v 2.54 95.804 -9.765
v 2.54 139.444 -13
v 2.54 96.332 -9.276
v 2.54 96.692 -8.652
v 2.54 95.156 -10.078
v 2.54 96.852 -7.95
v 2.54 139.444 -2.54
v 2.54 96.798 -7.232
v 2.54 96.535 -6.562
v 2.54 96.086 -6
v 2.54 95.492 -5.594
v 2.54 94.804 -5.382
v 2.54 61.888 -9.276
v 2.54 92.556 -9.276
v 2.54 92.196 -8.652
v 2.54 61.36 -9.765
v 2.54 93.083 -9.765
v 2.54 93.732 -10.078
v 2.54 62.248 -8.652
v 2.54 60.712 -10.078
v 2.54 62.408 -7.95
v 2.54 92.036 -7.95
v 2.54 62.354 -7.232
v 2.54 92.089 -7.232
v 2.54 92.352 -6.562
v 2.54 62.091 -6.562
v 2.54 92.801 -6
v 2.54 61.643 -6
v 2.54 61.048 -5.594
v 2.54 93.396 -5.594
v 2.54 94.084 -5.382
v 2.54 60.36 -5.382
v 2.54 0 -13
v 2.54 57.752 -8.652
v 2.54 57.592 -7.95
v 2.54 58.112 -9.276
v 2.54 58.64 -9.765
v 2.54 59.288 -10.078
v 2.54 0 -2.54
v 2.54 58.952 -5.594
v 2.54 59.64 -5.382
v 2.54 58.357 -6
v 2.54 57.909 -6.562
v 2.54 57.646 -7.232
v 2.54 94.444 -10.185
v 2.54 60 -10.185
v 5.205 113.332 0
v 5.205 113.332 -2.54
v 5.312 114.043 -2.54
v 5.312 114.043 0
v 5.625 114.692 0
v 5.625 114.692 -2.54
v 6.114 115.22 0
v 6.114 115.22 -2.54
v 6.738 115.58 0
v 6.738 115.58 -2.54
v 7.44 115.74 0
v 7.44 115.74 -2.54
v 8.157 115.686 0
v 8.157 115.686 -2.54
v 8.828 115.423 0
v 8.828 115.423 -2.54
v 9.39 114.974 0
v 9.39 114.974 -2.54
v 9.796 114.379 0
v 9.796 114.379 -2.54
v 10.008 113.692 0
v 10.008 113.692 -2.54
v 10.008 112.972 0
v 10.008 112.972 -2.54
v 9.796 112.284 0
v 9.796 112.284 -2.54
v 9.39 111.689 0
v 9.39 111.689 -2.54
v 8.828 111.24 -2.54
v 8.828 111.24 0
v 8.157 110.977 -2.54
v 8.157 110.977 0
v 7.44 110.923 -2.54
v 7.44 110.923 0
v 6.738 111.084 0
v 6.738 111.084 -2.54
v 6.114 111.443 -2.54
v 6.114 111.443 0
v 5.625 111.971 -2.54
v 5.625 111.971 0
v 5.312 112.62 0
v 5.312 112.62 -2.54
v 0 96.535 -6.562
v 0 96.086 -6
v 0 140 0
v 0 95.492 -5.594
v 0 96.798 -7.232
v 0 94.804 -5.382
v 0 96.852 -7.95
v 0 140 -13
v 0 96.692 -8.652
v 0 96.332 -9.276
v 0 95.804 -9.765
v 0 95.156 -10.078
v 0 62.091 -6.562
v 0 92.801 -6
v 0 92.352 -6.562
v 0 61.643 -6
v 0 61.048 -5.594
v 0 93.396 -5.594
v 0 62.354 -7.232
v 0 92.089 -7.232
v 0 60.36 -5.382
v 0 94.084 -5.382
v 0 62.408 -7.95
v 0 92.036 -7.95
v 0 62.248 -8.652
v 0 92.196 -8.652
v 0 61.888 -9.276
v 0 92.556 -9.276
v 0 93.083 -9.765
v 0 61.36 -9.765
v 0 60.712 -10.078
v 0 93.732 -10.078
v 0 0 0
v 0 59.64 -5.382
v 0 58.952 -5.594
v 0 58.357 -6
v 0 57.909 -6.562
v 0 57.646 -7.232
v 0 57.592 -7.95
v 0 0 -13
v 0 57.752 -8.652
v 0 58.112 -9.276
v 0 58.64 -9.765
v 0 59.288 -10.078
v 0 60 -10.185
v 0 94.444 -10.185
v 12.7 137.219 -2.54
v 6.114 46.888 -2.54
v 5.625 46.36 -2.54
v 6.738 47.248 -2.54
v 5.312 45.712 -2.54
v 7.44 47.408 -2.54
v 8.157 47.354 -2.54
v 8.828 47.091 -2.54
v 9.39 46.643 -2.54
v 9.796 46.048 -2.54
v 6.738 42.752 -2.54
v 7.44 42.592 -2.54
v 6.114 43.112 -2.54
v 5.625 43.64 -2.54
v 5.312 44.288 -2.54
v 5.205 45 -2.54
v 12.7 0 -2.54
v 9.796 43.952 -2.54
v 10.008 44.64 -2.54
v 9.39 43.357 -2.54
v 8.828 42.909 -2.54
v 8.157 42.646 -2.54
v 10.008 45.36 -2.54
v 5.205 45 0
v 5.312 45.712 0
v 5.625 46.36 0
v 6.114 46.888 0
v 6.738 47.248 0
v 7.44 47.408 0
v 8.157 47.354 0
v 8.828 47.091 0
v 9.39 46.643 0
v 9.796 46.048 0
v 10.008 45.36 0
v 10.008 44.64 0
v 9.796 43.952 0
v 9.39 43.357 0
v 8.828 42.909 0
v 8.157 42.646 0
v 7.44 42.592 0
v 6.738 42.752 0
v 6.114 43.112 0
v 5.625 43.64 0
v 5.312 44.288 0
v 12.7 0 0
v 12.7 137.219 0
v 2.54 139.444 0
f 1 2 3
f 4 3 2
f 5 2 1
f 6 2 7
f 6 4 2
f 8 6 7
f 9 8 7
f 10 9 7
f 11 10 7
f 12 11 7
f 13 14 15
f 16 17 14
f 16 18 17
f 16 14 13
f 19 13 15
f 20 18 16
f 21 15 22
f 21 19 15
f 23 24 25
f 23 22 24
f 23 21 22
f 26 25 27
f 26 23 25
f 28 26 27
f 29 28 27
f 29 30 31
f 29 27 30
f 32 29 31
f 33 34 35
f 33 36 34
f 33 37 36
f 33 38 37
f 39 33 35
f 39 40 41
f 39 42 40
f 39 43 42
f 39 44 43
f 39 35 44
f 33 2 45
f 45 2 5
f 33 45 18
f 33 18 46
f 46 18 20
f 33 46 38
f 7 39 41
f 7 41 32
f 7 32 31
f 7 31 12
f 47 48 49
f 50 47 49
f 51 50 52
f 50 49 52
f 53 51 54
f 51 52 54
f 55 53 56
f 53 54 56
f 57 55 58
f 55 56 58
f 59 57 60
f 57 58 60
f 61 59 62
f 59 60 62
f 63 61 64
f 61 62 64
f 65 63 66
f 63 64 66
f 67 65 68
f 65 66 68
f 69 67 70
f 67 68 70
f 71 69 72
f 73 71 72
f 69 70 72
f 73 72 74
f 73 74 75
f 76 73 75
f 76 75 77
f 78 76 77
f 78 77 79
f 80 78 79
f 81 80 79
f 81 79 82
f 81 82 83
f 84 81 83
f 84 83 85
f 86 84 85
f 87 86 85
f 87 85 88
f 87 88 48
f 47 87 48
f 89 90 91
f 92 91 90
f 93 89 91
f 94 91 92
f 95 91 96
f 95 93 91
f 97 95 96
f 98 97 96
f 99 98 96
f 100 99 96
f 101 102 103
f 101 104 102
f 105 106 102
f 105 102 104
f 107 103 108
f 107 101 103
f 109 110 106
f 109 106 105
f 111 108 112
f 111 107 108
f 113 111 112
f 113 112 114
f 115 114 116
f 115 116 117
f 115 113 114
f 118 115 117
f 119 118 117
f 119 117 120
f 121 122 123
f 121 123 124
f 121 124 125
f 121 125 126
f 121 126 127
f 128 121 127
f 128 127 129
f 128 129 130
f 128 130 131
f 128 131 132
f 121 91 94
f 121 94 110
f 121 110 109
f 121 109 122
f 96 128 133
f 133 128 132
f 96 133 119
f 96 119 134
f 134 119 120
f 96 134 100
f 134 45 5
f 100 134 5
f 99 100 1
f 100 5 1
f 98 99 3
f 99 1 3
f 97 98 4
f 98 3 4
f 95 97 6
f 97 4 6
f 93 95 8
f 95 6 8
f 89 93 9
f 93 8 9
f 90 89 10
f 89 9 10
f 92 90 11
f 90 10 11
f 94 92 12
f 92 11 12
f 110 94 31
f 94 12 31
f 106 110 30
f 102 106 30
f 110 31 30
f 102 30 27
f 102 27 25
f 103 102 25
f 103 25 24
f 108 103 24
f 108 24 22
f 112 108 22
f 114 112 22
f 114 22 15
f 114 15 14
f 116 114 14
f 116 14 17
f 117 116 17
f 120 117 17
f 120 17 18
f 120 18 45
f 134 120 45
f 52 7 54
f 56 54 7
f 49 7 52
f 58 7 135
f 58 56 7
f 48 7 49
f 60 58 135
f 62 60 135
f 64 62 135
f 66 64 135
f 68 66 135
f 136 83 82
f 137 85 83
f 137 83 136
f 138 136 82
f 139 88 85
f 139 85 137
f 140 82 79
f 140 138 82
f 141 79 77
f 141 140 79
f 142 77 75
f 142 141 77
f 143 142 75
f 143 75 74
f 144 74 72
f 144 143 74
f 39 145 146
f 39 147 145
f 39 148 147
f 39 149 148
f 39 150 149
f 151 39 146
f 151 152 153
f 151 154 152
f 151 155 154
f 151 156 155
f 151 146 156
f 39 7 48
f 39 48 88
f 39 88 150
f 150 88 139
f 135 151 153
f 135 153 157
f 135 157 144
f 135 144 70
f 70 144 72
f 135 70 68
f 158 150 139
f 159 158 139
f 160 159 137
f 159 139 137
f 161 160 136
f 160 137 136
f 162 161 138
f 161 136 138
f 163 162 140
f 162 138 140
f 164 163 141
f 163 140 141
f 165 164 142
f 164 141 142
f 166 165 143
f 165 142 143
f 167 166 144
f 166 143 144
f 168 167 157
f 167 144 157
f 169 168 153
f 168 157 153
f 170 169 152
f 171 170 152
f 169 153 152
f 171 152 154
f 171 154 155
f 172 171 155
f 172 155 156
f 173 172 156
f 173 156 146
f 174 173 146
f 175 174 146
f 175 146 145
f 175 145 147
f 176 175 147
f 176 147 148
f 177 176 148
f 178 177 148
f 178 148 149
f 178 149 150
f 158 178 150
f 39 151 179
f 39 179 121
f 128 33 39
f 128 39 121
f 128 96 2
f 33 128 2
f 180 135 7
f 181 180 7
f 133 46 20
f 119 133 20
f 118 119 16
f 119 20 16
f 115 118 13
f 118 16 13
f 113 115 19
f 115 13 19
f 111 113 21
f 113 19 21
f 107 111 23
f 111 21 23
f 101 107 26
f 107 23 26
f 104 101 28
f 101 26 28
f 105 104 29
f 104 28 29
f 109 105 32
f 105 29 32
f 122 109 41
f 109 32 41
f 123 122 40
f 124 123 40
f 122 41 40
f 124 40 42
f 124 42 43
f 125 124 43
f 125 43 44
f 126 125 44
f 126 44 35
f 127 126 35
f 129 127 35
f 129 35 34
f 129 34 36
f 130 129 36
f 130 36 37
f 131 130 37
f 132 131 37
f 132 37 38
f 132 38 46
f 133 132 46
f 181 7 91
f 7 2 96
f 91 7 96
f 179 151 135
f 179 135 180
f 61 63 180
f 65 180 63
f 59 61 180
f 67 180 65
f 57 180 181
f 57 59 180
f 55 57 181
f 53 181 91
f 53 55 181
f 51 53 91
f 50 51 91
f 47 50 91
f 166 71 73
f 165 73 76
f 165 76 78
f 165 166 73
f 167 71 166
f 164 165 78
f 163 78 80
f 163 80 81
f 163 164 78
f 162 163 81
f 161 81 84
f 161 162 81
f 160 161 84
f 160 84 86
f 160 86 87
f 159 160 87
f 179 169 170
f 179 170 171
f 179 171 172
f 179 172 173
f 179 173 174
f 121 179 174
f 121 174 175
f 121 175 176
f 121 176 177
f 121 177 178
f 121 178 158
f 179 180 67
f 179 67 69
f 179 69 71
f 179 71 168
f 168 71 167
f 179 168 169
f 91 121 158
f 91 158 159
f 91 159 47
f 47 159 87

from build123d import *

# Parameters (mm, degrees)
BOSS_EXTRUDE1_DEPTH     = 140
CUT_EXTRUDE1_DEPTH      = 18.35
CUT_EXTRUDE1_DEPTH_BACK = 6.35
SKETCH3_R               = 2.415
CUT_EXTRUDE2_DEPTH      = 10
SKETCH4_R               = 2.415
CUT_EXTRUDE3_DEPTH      = 10
SKETCH5_R               = 2.415
CUT_EXTRUDE4_DEPTH      = 10
SKETCH6_R               = 2.415
CUT_EXTRUDE5_DEPTH      = 10


with BuildPart() as part:
    # Sketch1 → Boss-Extrude1 (new body)
    with BuildSketch(Plane(origin=(0, 0, 0), x_dir=(1, 0, 0), z_dir=(0, 1, 0))):
        Polygon((0, 0), (0, 12.99972), (2.54, 12.99972), (2.54, 2.54), (12.7, 2.54), (12.7, 0), align=None)
    extrude(amount=BOSS_EXTRUDE1_DEPTH)

    # Sketch2 → Cut-Extrude1 (cut, two sides)
    with BuildSketch(Plane(origin=(0, 0, -2.54), x_dir=(-1, 0, 0), z_dir=(0, 0, -1))) as cut_extrude1_sk:
        Polygon((-2.54, 139.443868054), (0, 140), (-11.159733345, 144.634657465), (-16.37733561, 136.414189162), (-12.7, 137.219340268), (-12.7, 140), (-2.54, 140), align=None)
        Polygon((-12.7, 137.219340268), (-2.54, 139.443868054), (-2.54, 140), (-12.7, 140), align=None)
    extrude(amount=CUT_EXTRUDE1_DEPTH, mode=Mode.SUBTRACT)
    extrude(cut_extrude1_sk.sketch, amount=-CUT_EXTRUDE1_DEPTH_BACK, mode=Mode.SUBTRACT)

    # Sketch3 → Cut-Extrude2 (cut)
    with BuildSketch(Plane(origin=(0, 0, -2.54), x_dir=(-1, 0, 0), z_dir=(0, 0, -1))):
        with Locations((-7.62, 113.331604161)):
            Circle(SKETCH3_R)
    extrude(amount=-CUT_EXTRUDE2_DEPTH, mode=Mode.SUBTRACT)

    # Sketch4 → Cut-Extrude3 (cut)
    with BuildSketch(Plane(origin=(2.54, 0, 0), x_dir=(0, 0, -1), z_dir=(1, 0, 0))):
        with Locations((7.76986, 94.443868054)):
            Circle(SKETCH4_R)
    extrude(amount=-CUT_EXTRUDE3_DEPTH, mode=Mode.SUBTRACT)

    # Sketch5 → Cut-Extrude4 (cut)
    with BuildSketch(Plane(origin=(2.54, 0, 0), x_dir=(0, 0, -1), z_dir=(1, 0, 0))):
        with Locations((7.76986, 60)):
            Circle(SKETCH5_R)
    extrude(amount=-CUT_EXTRUDE4_DEPTH, mode=Mode.SUBTRACT)

    # Sketch6 → Cut-Extrude5 (cut)
    with BuildSketch(Plane(origin=(0, 0, -2.54), x_dir=(-1, 0, 0), z_dir=(0, 0, -1))):
        with Locations((-7.62, 45)):
            Circle(SKETCH6_R)
    extrude(amount=-CUT_EXTRUDE5_DEPTH, mode=Mode.SUBTRACT)


solid = part.part
